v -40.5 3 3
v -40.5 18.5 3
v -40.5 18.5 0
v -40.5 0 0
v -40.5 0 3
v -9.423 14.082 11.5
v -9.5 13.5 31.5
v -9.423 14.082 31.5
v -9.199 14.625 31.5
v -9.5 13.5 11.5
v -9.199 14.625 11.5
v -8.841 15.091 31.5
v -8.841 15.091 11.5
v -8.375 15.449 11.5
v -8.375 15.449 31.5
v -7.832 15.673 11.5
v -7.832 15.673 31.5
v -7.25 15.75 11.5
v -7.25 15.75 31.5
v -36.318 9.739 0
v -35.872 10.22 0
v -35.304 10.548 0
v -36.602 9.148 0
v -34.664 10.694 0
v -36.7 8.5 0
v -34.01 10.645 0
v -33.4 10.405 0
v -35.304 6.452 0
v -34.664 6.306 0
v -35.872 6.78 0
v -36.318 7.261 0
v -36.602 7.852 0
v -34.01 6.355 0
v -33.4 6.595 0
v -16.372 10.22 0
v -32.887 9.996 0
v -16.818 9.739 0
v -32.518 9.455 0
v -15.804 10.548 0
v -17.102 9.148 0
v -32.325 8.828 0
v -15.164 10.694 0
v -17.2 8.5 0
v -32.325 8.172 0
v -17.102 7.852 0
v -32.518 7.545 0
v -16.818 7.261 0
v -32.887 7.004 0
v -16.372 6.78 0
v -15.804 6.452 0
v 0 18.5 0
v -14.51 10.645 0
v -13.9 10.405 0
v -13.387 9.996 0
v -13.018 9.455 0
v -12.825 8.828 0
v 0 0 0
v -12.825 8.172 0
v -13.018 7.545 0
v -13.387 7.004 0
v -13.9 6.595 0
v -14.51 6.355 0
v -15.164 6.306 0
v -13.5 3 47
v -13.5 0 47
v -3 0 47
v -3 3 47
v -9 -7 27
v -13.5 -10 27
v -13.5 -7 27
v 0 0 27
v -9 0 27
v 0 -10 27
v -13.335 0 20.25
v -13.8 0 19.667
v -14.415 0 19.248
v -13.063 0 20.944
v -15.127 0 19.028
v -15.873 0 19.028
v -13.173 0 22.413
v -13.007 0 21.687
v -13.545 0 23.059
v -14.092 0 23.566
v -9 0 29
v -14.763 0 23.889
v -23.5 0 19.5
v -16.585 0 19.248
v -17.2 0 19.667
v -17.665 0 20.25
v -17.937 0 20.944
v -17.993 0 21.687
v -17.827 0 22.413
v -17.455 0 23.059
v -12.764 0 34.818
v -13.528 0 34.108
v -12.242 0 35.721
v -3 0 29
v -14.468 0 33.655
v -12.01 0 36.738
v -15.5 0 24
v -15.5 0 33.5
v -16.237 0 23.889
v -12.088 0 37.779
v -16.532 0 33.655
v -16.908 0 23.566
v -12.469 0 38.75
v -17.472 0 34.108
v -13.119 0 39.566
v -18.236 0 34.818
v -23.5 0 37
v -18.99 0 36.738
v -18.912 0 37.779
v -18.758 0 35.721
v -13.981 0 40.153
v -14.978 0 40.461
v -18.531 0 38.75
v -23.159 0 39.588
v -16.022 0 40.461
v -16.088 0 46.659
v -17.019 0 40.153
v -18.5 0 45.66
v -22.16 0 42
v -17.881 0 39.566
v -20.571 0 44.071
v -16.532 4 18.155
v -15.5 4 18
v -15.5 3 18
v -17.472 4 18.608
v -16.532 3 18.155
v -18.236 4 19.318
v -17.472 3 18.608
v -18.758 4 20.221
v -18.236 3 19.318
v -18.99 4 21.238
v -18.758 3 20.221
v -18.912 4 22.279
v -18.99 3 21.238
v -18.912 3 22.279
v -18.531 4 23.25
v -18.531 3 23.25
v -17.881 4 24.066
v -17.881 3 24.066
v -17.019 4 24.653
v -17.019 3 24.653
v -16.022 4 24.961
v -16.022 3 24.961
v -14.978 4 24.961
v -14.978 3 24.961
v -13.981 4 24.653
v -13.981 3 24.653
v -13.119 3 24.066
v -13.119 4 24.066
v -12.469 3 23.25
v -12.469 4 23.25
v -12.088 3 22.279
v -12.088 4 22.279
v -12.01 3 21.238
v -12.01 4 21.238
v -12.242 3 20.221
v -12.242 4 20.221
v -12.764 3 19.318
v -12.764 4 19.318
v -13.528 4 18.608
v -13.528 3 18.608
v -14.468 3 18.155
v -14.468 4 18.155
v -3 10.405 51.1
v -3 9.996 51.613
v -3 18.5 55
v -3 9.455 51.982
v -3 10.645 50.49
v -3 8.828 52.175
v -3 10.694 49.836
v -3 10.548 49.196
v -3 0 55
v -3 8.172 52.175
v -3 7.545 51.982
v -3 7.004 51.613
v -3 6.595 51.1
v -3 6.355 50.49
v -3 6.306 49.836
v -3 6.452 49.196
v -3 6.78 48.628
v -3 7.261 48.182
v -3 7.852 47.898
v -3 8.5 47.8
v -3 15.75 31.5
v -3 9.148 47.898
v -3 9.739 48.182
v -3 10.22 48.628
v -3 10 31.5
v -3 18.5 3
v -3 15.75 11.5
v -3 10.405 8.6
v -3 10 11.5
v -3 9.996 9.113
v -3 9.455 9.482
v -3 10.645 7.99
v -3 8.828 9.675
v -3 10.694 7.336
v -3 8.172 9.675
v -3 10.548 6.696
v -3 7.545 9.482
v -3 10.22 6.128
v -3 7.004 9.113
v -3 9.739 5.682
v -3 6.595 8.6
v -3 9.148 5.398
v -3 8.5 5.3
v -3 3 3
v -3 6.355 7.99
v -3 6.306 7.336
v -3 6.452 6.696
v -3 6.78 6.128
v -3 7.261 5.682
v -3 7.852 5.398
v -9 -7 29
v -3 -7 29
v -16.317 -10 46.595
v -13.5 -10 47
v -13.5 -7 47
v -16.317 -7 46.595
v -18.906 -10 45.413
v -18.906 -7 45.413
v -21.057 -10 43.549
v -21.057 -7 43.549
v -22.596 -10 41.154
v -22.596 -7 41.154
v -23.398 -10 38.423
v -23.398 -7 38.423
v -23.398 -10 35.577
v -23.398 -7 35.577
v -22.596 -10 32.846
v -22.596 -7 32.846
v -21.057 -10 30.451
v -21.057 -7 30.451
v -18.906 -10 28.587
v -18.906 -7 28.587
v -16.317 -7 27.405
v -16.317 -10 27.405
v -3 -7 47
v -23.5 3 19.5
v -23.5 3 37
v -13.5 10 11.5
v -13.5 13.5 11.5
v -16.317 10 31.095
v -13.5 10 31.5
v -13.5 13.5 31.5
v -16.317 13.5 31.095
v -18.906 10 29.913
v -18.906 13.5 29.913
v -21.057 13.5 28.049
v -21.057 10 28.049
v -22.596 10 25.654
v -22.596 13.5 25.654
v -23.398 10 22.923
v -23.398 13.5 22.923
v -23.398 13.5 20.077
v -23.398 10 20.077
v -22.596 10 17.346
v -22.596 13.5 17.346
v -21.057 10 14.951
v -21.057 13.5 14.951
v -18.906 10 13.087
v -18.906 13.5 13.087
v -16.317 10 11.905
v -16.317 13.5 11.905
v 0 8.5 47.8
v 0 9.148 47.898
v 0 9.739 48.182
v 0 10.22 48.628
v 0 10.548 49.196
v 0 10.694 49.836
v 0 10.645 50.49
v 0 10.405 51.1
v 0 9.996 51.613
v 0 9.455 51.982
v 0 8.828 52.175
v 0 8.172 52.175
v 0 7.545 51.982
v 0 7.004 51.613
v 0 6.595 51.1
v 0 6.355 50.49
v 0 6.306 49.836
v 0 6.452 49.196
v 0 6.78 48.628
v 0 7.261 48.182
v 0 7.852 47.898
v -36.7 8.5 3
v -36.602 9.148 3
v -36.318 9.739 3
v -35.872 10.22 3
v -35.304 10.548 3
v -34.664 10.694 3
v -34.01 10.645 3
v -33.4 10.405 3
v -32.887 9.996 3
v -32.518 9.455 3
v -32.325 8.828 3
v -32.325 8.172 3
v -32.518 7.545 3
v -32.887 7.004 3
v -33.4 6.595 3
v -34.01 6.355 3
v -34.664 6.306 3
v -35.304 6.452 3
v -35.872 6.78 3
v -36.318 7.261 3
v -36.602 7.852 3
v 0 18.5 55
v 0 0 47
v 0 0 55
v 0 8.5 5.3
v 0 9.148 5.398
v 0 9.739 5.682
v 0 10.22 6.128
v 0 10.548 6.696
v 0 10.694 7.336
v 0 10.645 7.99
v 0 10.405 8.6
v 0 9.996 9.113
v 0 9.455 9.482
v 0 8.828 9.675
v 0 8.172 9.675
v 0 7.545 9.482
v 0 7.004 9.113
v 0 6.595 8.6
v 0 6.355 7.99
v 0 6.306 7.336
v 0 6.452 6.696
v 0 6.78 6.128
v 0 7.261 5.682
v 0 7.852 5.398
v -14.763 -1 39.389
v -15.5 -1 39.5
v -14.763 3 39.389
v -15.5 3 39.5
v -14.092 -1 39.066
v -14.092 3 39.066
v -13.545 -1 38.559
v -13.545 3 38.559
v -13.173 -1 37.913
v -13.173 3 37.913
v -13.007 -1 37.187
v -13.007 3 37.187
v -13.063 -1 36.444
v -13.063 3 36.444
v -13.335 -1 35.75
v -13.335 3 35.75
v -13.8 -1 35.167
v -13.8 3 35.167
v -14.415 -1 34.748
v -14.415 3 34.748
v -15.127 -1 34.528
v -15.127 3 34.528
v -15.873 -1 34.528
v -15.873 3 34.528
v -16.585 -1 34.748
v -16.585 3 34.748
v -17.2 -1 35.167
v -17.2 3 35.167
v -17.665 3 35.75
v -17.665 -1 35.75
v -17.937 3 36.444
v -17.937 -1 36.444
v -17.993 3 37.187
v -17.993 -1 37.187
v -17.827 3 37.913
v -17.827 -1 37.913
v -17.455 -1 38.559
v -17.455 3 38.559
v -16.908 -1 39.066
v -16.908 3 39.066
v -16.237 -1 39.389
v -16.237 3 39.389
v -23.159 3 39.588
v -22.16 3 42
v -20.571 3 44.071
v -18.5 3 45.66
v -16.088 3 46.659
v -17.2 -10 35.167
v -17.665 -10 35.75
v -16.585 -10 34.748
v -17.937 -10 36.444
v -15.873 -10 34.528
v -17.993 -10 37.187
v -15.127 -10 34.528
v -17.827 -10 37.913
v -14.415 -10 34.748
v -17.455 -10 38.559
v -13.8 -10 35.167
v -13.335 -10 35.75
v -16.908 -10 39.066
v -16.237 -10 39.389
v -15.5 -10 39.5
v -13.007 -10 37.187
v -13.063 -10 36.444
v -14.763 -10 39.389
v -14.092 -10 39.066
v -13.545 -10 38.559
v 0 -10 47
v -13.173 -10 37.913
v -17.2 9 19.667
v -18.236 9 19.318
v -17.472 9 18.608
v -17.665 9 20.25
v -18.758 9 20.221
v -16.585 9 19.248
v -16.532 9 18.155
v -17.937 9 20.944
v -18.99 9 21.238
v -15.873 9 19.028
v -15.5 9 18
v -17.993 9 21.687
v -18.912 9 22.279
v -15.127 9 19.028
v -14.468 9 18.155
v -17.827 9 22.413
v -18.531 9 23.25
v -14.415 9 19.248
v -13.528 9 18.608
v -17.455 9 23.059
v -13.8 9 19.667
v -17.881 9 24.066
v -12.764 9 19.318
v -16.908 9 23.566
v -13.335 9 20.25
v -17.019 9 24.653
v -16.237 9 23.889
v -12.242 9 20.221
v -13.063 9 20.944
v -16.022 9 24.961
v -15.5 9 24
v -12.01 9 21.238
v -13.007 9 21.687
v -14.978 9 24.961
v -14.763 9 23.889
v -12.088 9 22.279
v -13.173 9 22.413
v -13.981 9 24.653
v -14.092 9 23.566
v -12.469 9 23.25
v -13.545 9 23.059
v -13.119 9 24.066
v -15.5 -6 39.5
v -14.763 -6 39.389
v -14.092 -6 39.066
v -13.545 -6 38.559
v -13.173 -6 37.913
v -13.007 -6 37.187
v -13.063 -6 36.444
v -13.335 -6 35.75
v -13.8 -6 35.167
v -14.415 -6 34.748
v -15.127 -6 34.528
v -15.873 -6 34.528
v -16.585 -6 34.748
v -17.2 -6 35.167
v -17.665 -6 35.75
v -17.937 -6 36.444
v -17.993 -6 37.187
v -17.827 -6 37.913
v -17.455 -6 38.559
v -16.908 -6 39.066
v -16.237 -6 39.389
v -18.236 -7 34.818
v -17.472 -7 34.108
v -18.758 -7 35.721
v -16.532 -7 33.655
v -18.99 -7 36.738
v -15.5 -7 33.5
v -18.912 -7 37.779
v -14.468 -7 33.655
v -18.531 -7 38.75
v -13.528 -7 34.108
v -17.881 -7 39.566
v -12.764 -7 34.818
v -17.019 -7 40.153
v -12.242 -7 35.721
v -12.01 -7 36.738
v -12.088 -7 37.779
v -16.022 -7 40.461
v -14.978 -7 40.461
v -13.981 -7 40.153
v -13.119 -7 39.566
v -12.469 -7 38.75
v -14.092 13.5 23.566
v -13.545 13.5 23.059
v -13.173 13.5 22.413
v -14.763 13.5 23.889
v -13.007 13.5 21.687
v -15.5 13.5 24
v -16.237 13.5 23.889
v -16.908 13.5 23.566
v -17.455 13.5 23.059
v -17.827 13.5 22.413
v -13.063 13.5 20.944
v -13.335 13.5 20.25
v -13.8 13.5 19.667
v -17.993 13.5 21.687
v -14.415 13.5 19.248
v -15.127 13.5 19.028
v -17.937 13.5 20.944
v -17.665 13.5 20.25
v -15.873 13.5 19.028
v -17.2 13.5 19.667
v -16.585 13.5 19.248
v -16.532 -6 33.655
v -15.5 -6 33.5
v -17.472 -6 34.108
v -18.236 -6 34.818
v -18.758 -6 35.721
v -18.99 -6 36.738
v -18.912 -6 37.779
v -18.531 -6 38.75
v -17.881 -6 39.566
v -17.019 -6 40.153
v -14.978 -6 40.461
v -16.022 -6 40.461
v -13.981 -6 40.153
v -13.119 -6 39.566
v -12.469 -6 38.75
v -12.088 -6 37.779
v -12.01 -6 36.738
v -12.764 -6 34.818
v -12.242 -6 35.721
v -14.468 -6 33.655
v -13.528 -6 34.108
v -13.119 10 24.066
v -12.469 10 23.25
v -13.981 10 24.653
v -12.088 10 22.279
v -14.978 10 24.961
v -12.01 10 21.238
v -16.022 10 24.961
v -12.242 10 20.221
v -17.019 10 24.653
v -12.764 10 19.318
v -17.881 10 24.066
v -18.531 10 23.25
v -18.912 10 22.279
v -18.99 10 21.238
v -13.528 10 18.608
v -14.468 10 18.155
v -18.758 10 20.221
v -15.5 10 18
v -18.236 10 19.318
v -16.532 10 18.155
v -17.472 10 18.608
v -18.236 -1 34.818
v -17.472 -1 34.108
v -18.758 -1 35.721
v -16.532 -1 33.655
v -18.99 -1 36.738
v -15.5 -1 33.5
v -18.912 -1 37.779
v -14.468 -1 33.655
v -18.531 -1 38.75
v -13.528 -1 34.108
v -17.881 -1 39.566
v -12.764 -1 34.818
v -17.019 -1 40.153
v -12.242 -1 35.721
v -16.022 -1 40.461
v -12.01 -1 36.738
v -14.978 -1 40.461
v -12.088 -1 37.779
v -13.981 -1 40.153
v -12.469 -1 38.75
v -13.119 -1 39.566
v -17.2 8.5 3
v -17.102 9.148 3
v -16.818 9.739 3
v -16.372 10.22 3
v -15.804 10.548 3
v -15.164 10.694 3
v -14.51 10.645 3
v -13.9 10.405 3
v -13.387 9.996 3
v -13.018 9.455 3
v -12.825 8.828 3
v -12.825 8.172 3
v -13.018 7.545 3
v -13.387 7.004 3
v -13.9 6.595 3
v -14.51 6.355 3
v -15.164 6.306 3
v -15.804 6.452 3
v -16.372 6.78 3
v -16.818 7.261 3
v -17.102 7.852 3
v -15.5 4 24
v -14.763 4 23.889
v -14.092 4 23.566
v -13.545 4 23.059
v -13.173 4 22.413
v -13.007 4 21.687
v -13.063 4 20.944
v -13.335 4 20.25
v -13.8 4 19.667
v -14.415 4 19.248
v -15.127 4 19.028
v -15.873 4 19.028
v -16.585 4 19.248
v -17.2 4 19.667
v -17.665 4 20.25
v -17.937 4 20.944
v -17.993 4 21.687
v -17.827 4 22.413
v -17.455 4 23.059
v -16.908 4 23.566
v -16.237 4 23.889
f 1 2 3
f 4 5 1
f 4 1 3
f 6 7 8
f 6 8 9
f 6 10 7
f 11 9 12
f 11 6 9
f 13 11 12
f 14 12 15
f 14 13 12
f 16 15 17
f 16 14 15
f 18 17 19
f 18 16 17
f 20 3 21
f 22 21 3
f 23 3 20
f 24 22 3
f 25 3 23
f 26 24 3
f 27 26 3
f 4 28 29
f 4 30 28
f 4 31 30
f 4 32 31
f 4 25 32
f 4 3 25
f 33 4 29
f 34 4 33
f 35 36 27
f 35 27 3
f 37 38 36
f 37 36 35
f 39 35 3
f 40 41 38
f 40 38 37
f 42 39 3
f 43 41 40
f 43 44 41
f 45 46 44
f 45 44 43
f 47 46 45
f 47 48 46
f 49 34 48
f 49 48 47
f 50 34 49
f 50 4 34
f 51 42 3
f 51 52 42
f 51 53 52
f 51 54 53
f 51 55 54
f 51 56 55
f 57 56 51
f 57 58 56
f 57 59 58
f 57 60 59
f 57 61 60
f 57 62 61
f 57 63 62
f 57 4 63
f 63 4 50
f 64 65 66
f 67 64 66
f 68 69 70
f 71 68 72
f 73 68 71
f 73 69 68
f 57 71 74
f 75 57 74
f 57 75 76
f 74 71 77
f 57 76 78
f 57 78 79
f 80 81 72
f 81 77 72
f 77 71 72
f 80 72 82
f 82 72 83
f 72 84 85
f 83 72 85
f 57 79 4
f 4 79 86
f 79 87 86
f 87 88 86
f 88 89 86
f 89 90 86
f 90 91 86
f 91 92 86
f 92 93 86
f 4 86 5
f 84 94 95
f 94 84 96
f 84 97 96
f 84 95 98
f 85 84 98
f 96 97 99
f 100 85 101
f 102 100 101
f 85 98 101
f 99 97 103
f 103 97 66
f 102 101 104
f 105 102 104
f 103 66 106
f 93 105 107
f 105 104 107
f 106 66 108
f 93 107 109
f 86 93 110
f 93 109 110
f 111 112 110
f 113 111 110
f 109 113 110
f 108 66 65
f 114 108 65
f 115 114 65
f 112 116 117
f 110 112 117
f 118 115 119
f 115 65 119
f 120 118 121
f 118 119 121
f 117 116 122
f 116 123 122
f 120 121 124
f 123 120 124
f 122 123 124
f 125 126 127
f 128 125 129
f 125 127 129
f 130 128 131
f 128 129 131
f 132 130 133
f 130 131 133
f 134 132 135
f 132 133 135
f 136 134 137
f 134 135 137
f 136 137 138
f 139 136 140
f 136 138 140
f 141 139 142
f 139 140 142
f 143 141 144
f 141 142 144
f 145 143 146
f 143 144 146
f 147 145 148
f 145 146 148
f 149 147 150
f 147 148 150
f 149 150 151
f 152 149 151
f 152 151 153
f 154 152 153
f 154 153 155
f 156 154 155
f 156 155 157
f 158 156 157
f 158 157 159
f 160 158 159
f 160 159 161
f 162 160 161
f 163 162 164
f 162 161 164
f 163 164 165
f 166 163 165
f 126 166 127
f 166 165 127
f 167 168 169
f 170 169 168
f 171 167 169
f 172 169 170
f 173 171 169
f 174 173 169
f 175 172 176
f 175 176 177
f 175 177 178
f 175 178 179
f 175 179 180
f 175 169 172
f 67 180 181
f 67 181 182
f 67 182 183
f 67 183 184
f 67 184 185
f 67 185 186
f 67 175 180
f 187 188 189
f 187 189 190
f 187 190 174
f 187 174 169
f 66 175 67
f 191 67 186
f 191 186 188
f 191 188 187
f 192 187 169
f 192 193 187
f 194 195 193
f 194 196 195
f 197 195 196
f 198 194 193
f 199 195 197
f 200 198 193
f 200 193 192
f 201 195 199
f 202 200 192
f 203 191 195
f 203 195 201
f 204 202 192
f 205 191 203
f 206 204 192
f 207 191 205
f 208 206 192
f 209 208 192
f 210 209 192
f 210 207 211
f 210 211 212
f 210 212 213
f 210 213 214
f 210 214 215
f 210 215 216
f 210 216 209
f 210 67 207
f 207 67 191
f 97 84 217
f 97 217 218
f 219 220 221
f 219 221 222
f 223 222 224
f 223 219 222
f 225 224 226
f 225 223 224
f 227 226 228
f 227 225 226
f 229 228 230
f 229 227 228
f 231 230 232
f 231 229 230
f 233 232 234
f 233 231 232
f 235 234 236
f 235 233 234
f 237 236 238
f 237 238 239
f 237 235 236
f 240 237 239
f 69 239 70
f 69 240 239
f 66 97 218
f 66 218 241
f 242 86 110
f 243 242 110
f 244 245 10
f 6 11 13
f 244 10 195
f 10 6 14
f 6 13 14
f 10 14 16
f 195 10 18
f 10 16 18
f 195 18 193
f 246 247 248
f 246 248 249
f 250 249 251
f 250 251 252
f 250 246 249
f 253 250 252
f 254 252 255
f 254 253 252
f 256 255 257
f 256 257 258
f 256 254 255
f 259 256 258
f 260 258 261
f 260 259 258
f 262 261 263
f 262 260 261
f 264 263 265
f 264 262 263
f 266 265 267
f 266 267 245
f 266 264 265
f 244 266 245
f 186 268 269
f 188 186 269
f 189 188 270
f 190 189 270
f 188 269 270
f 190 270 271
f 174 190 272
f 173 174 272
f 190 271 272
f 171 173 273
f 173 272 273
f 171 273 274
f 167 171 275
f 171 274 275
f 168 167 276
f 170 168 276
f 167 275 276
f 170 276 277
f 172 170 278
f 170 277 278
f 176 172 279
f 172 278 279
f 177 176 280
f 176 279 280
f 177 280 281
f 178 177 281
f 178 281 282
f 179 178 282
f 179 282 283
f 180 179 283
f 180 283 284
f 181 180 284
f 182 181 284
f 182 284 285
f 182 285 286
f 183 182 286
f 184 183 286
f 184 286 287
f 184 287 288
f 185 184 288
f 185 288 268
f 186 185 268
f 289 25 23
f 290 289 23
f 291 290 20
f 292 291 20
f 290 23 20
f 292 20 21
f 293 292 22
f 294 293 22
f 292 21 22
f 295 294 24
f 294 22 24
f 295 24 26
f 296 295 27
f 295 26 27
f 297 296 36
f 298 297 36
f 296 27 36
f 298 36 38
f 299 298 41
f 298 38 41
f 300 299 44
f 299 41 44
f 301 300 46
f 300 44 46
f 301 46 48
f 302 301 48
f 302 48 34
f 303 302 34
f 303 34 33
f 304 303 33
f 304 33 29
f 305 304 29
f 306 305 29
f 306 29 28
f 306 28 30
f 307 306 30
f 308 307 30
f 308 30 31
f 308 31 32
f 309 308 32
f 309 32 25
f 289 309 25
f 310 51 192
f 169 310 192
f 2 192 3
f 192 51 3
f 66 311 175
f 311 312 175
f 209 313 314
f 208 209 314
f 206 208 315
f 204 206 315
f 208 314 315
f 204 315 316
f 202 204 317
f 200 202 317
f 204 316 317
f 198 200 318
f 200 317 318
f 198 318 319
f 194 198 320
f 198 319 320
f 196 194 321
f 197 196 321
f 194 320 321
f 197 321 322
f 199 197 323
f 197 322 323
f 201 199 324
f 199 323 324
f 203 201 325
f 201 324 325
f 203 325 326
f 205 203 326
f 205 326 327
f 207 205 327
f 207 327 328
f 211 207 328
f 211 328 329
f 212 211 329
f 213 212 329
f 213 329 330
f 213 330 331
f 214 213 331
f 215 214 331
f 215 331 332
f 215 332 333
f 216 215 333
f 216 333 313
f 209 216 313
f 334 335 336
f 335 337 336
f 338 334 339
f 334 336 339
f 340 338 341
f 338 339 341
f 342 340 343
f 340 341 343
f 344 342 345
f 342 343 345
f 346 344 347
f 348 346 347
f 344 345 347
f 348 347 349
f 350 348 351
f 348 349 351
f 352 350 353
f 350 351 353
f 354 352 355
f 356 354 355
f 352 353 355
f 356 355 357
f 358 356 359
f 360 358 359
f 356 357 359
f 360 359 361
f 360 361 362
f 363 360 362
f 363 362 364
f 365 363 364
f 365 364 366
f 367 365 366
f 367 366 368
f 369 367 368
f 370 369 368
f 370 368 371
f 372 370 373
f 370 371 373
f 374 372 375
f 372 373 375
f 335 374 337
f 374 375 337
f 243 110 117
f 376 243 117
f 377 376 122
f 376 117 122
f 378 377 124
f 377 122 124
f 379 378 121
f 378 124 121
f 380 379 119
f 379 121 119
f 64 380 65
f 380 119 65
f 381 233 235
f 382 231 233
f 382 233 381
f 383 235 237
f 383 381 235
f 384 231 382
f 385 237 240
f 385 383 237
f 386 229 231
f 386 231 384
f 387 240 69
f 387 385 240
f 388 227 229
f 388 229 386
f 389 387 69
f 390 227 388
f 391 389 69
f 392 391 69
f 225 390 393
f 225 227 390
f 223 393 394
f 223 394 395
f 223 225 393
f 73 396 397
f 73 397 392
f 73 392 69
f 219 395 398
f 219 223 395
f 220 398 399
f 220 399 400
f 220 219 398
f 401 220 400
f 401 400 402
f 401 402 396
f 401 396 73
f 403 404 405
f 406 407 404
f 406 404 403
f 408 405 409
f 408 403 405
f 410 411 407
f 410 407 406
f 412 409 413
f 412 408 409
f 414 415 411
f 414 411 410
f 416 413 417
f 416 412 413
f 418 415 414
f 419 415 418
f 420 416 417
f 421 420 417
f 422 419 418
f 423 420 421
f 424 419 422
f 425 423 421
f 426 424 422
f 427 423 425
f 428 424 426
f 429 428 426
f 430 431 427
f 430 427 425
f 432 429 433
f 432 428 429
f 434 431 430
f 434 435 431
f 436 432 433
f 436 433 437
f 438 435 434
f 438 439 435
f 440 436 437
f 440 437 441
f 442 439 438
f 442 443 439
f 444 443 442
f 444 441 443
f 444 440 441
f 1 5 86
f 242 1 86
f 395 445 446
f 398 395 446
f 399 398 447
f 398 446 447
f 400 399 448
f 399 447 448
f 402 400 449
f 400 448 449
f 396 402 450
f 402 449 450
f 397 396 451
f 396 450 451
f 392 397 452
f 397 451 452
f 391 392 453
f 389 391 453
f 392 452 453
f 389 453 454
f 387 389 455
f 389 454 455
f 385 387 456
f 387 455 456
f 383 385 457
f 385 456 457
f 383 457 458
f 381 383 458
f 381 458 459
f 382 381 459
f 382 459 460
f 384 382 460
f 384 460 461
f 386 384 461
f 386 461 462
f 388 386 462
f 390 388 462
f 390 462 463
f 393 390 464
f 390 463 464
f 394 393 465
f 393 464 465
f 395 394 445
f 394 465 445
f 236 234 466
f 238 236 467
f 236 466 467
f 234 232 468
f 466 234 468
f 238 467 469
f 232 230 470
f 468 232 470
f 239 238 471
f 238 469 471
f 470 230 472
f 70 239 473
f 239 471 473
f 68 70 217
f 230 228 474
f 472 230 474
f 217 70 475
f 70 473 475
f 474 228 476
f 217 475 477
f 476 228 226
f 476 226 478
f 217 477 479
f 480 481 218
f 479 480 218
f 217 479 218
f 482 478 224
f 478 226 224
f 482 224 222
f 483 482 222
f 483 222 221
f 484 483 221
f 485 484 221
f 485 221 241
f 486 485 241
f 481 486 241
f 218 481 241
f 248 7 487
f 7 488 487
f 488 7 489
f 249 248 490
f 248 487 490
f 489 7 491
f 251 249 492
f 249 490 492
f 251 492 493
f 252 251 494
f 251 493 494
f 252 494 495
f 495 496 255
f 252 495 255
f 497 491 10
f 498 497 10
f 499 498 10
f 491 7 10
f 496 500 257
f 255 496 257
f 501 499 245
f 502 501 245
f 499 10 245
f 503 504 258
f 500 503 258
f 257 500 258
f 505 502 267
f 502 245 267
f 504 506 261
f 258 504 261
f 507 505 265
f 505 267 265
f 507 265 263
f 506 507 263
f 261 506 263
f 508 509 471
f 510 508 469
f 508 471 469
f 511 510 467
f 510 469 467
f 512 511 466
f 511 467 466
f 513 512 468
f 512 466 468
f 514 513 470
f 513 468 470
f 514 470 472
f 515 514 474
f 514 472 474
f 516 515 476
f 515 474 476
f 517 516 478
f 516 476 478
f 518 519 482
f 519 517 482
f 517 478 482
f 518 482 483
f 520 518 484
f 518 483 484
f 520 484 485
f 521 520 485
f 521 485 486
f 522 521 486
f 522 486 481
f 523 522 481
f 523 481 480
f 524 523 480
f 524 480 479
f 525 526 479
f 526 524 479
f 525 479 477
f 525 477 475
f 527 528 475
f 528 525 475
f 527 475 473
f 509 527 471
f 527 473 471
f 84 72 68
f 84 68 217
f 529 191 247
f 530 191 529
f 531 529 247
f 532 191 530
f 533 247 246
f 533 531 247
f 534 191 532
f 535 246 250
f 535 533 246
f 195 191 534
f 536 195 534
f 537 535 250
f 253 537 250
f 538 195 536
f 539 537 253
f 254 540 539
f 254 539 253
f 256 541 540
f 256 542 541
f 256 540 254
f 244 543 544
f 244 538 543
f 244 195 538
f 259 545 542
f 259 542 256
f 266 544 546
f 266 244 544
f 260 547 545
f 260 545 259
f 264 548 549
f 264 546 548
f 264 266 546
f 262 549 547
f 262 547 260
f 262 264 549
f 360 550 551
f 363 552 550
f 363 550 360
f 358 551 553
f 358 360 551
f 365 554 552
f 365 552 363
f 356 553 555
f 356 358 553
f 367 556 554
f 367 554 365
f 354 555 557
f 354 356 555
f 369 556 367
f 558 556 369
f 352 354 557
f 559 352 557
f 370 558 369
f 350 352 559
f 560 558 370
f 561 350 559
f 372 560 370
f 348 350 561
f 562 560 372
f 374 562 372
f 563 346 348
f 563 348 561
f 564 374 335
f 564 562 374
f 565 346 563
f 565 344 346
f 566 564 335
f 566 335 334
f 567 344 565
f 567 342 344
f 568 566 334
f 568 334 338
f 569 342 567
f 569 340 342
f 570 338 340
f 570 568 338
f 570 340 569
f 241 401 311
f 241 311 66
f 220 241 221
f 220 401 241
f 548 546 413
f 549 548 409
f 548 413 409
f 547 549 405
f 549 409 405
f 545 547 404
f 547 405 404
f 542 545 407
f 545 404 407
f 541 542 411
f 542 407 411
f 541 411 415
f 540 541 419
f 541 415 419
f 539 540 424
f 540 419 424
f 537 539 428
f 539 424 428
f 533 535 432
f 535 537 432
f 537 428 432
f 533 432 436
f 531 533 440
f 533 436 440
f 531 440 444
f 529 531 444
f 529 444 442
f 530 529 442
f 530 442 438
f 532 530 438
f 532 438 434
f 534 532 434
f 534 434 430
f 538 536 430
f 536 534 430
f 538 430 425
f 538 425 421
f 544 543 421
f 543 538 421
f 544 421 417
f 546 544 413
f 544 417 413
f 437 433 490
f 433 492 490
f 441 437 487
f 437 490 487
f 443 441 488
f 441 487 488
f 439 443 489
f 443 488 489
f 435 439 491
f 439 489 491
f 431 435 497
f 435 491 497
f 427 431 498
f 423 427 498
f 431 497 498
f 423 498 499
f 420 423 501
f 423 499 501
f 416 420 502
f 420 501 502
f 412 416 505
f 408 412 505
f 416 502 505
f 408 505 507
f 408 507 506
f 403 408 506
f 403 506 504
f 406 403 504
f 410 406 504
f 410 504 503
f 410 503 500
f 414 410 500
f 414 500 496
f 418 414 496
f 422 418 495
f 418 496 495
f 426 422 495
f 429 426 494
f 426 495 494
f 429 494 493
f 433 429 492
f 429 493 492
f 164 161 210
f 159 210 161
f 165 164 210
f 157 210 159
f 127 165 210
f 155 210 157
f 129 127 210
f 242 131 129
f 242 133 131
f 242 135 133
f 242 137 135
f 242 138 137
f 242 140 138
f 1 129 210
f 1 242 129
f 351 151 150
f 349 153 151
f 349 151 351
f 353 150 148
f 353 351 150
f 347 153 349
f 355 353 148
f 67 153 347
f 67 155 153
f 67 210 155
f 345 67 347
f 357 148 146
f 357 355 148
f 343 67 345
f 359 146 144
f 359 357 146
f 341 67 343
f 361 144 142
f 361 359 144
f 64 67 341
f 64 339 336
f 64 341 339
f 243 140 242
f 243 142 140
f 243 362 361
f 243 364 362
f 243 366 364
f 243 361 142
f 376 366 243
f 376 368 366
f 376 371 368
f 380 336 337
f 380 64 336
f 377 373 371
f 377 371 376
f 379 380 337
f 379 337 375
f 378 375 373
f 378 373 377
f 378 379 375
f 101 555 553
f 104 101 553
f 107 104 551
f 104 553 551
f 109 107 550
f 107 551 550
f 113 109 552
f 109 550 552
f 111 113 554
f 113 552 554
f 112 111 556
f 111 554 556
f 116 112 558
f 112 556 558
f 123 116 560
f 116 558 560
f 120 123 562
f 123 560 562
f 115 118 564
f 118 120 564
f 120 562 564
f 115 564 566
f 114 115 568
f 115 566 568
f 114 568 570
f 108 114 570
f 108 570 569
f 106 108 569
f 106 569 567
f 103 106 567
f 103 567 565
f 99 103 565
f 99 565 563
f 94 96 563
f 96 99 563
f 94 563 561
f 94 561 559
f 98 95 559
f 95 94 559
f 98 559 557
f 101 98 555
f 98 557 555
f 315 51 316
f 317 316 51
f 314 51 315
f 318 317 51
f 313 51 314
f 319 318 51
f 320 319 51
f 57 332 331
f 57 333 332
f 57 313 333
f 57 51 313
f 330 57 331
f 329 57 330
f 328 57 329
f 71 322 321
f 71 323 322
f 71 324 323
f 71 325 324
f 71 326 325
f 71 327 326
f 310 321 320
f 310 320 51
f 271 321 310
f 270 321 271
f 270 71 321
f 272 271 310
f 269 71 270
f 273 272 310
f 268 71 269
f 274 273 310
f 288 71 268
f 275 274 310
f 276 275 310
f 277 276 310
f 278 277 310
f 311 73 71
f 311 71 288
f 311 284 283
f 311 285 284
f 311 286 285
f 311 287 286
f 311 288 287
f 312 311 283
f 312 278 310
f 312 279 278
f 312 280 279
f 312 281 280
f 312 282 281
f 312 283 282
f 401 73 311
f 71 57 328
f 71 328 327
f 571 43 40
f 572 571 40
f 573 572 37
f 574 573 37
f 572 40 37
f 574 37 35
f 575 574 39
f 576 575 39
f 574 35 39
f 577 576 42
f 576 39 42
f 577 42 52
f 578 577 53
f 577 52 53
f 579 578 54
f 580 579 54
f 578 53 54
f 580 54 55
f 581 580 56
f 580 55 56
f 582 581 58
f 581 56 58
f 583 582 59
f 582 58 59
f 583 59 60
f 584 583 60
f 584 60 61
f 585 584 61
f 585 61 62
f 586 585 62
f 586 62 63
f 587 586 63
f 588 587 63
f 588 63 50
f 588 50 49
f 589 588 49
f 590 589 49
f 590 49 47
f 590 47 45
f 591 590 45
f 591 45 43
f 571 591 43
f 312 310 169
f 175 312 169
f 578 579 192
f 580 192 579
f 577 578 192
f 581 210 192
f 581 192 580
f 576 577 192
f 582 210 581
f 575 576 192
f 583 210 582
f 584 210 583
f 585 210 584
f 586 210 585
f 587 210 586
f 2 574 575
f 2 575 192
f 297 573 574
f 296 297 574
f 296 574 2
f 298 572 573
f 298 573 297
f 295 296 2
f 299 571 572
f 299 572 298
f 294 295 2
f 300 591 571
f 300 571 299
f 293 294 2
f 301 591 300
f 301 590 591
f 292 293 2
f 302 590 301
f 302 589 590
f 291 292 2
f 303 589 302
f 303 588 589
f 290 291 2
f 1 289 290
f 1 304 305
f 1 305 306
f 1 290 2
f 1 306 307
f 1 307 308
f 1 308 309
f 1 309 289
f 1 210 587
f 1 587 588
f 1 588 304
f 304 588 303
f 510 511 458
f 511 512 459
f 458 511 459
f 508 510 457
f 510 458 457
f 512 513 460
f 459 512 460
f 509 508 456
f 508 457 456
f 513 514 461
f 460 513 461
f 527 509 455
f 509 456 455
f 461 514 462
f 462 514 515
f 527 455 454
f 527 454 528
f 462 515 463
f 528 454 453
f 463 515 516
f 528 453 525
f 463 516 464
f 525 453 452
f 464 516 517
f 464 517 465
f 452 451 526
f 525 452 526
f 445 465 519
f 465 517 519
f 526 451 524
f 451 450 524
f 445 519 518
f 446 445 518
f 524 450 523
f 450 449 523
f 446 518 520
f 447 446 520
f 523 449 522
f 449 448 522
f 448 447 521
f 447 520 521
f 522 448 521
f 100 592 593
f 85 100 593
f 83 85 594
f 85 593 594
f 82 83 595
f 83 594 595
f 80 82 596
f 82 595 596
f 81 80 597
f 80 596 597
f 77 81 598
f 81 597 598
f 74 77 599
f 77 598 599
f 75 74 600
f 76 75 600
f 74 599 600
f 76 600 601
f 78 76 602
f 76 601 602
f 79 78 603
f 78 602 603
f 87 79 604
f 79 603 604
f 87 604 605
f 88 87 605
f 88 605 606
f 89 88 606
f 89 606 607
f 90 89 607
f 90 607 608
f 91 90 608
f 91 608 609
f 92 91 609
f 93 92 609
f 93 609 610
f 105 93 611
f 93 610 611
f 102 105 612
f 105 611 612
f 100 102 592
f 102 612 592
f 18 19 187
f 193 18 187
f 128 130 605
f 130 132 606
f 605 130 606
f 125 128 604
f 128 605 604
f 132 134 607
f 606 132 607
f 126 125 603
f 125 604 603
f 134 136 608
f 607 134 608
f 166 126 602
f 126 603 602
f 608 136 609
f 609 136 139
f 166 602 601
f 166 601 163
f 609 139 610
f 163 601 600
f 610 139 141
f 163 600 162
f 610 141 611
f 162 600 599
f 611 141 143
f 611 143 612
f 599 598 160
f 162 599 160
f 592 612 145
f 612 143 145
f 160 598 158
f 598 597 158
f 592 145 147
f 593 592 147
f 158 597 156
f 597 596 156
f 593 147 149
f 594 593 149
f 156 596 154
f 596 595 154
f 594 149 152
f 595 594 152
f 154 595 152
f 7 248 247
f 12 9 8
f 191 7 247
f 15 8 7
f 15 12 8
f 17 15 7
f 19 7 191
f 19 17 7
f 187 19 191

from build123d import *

# Parameters (mm, degrees)
BOSS_EXTRUDE1_DEPTH = 18.5
BOSS_EXTRUDE2_DEPTH = 3
BOSS_EXTRUDE3_START = 7
BOSS_EXTRUDE3_DEPTH = 3.5
SKETCH4_W           = 6.5
SKETCH4_H           = 2.25
BOSS_EXTRUDE4_DEPTH = 20
FILLET1_R           = 2.25
BOSS_EXTRUDE5_DEPTH = 7
BOSS_EXTRUDE6_START = 3
BOSS_EXTRUDE6_DEPTH = 3
SKETCH7_R           = 2.5
CUT_EXTRUDE1_DEPTH  = 73.232264259
SKETCH8_R           = 2.2
CUT_EXTRUDE2_DEPTH  = 71.763691255
CUT_EXTRUDE3_REACH  = 72.764
SKETCH9_R           = 2.2
BOSS_EXTRUDE7_REACH = 74.907
SKETCH10_R          = 3.5
SKETCH10_R_2        = 2.5
BOSS_EXTRUDE8_REACH = 72.039
SKETCH11_R          = 3.5
SKETCH11_R_2        = 2.5
CUT_EXTRUDE4_REACH  = 66.742
SKETCH12_W          = 7
SKETCH12_H          = 5


with BuildPart() as part:
    # Sketch1 → Boss-Extrude1 (new body)
    with BuildSketch(Plane(origin=(0, 0, 0), x_dir=(1, 0, 0), z_dir=(0, 1, 0))):
        Polygon((-40.5, 0), (0, 0), (0, -55), (-3, -55), (-3, -3), (-40.5, -3), align=None)
    extrude(amount=BOSS_EXTRUDE1_DEPTH)

    # Sketch2 → Boss-Extrude2 (add)
    with BuildSketch(Plane.XZ):
        with BuildLine():
            Line((-40.5, 3), (-23.5, 19.5))
            Line((-23.5, 19.5), (-23.5, 37))
            ThreePointArc((-23.5, 37), (-20.571067812, 44.071067812), (-13.5, 47))
            Line((-13.5, 47), (-3, 47))
            Line((-3, 47), (-3, 3))
            Line((-3, 3), (-40.5, 3))
        make_face()
    extrude(amount=-BOSS_EXTRUDE2_DEPTH)

    # Sketch3 → Boss-Extrude3 (add)
    with BuildSketch(Plane(origin=(0, 3, 0), x_dir=(1, 0, 0), z_dir=(0, 1, 0)).offset(BOSS_EXTRUDE3_START)):
        with BuildLine():
            Line((-3, -31.5), (-13.5, -31.5))
            ThreePointArc((-13.5, -31.5), (-23.5, -21.5), (-13.5, -11.5))
            Line((-13.5, -11.5), (-3, -11.5))
            Line((-3, -11.5), (-3, -31.5))
        make_face()
    extrude(amount=BOSS_EXTRUDE3_DEPTH)

    # Sketch4 → Boss-Extrude4 (add)
    with BuildSketch(Plane.XY.offset(31.5)):
        with Locations((-6.25, 14.625)):
            Rectangle(SKETCH4_W, SKETCH4_H)
    extrude(amount=-BOSS_EXTRUDE4_DEPTH)

    # Fillet1
    fillet1_edges = [part.edges().sort_by_distance(p)[0] for p in [
        (-9.5, 15.75, 21.5),
    ]]
    fillet(fillet1_edges, radius=FILLET1_R - 0.0001)  # a hair under: the kernel refuses the full size

    # Sketch5 → Boss-Extrude5 (add)
    with BuildSketch(Plane.XZ):
        Polygon((0, 47), (0, 27), (-9, 27), (-9, 29), (-3, 29), (-3, 47), align=None)
    extrude(amount=BOSS_EXTRUDE5_DEPTH)

    # Sketch6 → Boss-Extrude6 (add)
    with BuildSketch(Plane.XZ.offset(7).offset(BOSS_EXTRUDE6_START)):
        with BuildLine():
            Line((0, 27), (0, 47))
            Line((0, 47), (-13.5, 47))
            ThreePointArc((-13.5, 47), (-23.5, 37), (-13.5, 27))
            Line((-13.5, 27), (0, 27))
        make_face()
    extrude(amount=-BOSS_EXTRUDE6_DEPTH)

    # Sketch7 → Cut-Extrude1 (cut, through all)
    with BuildSketch(Plane(origin=(0, 13.5, 0), x_dir=(1, 0, 0), z_dir=(0, 1, 0))):
        with Locations(Location((-15.5, -21.5, 0), (0, 0, 270))):
            Circle(SKETCH7_R)
        with Locations(Location((-15.5, -37, 0), (0, 0, 270))):
            Circle(SKETCH7_R)
    extrude(amount=-CUT_EXTRUDE1_DEPTH, mode=Mode.SUBTRACT)

    # Sketch8 → Cut-Extrude2 (cut, through all)
    with BuildSketch(Plane(origin=(0, 0, 0), x_dir=(0, 0, -1), z_dir=(1, 0, 0))):
        with Locations((-50, 8.5)):
            Circle(SKETCH8_R)
        with Locations((-7.5, 8.5)):
            Circle(SKETCH8_R)
    extrude(amount=-CUT_EXTRUDE2_DEPTH, mode=Mode.SUBTRACT)

    # Sketch9 → Cut-Extrude3 (cut, up to next)
    with BuildSketch(Plane(origin=(0, 0, 0), x_dir=(-1, 0, 0), z_dir=(0, 0, -1)), mode=Mode.PRIVATE) as cut_extrude3_sk1:
        with Locations((15, 8.5)):
            Circle(SKETCH9_R)
    cut_extrude3_tool1 = extrude(cut_extrude3_sk1.sketch, amount=-CUT_EXTRUDE3_REACH, mode=Mode.PRIVATE) & part.part
    # Sketch9 → Cut-Extrude3 (cut, up to next)
    with BuildSketch(Plane(origin=(0, 0, 0), x_dir=(-1, 0, 0), z_dir=(0, 0, -1)), mode=Mode.PRIVATE) as cut_extrude3_sk2:
        with Locations((34.5, 8.5)):
            Circle(SKETCH9_R)
    cut_extrude3_tool2 = extrude(cut_extrude3_sk2.sketch, amount=-CUT_EXTRUDE3_REACH, mode=Mode.PRIVATE) & part.part
    add(cut_extrude3_tool1.solids().sort_by_distance((-15, 8.5, 0))[0], mode=Mode.SUBTRACT)
    add(cut_extrude3_tool2.solids().sort_by_distance((-34.5, 8.5, 0))[0], mode=Mode.SUBTRACT)

    # Sketch10 → Boss-Extrude7 (add, up to next)
    with BuildSketch(Plane(origin=(0, -7, 0), x_dir=(1, 0, 0), z_dir=(0, 1, 0)), mode=Mode.PRIVATE) as boss_extrude7_sk1:
        with Locations(Location((-15.5, -37, 0), (0, 0, 90))):
            Circle(SKETCH10_R)
        with Locations(Location((-15.5, -37, 0), (0, 0, 270))):
            Circle(SKETCH10_R_2, mode=Mode.SUBTRACT)
    boss_extrude7_tool1 = extrude(boss_extrude7_sk1.sketch, amount=BOSS_EXTRUDE7_REACH, mode=Mode.PRIVATE) - part.part
    add(boss_extrude7_tool1.solids().sort_by_distance((-15.5, -7, 40.401005))[0])

    # Sketch11 → Boss-Extrude8 (add, up to next)
    with BuildSketch(Plane(origin=(0, 3, 0), x_dir=(1, 0, 0), z_dir=(0, 1, 0)), mode=Mode.PRIVATE) as boss_extrude8_sk1:
        with Locations(Location((-15.5, -21.5, 0), (0, 0, 90))):
            Circle(SKETCH11_R)
        with Locations(Location((-15.5, -21.5, 0), (0, 0, 270))):
            Circle(SKETCH11_R_2, mode=Mode.SUBTRACT)
    boss_extrude8_tool1 = extrude(boss_extrude8_sk1.sketch, amount=BOSS_EXTRUDE8_REACH, mode=Mode.PRIVATE) - part.part
    add(boss_extrude8_tool1.solids().sort_by_distance((-15.5, 3, 24.901005))[0])

    # Cut-Extrude4: up to this face of the body (flat: up to its plane)
    cut_extrude4_end = Plane(part.part.faces().sort_by_distance((-21.584376674, 10.874217494, 3))[0])
    # Sketch12 → Cut-Extrude4 (cut, up to the picked face)
    with BuildSketch(Plane.XY.offset(47), mode=Mode.PRIVATE) as cut_extrude4_sk1:
        with Locations((-15.5, -3.5)):
            Rectangle(SKETCH12_W, SKETCH12_H)
    cut_extrude4_tool1 = split(extrude(cut_extrude4_sk1.sketch, amount=-CUT_EXTRUDE4_REACH, mode=Mode.PRIVATE), bisect_by=cut_extrude4_end, keep=Keep.BOTH, mode=Mode.PRIVATE)
    # Sketch12 → Cut-Extrude4 (cut, up to the picked face)
    with BuildSketch(Plane.XY.offset(47), mode=Mode.PRIVATE) as cut_extrude4_sk2:
        with Locations((-15.5, 6.5)):
            Rectangle(SKETCH12_W, SKETCH12_H)
    cut_extrude4_tool2 = split(extrude(cut_extrude4_sk2.sketch, amount=-CUT_EXTRUDE4_REACH, mode=Mode.PRIVATE), bisect_by=cut_extrude4_end, keep=Keep.BOTH, mode=Mode.PRIVATE)
    add(cut_extrude4_tool1.solids().sort_by(Axis((-15.5, -3.5, 47), (0, 0, -1)))[0], mode=Mode.SUBTRACT)
    add(cut_extrude4_tool2.solids().sort_by(Axis((-15.5, 6.5, 47), (0, 0, -1)))[0], mode=Mode.SUBTRACT)


solid = part.part
